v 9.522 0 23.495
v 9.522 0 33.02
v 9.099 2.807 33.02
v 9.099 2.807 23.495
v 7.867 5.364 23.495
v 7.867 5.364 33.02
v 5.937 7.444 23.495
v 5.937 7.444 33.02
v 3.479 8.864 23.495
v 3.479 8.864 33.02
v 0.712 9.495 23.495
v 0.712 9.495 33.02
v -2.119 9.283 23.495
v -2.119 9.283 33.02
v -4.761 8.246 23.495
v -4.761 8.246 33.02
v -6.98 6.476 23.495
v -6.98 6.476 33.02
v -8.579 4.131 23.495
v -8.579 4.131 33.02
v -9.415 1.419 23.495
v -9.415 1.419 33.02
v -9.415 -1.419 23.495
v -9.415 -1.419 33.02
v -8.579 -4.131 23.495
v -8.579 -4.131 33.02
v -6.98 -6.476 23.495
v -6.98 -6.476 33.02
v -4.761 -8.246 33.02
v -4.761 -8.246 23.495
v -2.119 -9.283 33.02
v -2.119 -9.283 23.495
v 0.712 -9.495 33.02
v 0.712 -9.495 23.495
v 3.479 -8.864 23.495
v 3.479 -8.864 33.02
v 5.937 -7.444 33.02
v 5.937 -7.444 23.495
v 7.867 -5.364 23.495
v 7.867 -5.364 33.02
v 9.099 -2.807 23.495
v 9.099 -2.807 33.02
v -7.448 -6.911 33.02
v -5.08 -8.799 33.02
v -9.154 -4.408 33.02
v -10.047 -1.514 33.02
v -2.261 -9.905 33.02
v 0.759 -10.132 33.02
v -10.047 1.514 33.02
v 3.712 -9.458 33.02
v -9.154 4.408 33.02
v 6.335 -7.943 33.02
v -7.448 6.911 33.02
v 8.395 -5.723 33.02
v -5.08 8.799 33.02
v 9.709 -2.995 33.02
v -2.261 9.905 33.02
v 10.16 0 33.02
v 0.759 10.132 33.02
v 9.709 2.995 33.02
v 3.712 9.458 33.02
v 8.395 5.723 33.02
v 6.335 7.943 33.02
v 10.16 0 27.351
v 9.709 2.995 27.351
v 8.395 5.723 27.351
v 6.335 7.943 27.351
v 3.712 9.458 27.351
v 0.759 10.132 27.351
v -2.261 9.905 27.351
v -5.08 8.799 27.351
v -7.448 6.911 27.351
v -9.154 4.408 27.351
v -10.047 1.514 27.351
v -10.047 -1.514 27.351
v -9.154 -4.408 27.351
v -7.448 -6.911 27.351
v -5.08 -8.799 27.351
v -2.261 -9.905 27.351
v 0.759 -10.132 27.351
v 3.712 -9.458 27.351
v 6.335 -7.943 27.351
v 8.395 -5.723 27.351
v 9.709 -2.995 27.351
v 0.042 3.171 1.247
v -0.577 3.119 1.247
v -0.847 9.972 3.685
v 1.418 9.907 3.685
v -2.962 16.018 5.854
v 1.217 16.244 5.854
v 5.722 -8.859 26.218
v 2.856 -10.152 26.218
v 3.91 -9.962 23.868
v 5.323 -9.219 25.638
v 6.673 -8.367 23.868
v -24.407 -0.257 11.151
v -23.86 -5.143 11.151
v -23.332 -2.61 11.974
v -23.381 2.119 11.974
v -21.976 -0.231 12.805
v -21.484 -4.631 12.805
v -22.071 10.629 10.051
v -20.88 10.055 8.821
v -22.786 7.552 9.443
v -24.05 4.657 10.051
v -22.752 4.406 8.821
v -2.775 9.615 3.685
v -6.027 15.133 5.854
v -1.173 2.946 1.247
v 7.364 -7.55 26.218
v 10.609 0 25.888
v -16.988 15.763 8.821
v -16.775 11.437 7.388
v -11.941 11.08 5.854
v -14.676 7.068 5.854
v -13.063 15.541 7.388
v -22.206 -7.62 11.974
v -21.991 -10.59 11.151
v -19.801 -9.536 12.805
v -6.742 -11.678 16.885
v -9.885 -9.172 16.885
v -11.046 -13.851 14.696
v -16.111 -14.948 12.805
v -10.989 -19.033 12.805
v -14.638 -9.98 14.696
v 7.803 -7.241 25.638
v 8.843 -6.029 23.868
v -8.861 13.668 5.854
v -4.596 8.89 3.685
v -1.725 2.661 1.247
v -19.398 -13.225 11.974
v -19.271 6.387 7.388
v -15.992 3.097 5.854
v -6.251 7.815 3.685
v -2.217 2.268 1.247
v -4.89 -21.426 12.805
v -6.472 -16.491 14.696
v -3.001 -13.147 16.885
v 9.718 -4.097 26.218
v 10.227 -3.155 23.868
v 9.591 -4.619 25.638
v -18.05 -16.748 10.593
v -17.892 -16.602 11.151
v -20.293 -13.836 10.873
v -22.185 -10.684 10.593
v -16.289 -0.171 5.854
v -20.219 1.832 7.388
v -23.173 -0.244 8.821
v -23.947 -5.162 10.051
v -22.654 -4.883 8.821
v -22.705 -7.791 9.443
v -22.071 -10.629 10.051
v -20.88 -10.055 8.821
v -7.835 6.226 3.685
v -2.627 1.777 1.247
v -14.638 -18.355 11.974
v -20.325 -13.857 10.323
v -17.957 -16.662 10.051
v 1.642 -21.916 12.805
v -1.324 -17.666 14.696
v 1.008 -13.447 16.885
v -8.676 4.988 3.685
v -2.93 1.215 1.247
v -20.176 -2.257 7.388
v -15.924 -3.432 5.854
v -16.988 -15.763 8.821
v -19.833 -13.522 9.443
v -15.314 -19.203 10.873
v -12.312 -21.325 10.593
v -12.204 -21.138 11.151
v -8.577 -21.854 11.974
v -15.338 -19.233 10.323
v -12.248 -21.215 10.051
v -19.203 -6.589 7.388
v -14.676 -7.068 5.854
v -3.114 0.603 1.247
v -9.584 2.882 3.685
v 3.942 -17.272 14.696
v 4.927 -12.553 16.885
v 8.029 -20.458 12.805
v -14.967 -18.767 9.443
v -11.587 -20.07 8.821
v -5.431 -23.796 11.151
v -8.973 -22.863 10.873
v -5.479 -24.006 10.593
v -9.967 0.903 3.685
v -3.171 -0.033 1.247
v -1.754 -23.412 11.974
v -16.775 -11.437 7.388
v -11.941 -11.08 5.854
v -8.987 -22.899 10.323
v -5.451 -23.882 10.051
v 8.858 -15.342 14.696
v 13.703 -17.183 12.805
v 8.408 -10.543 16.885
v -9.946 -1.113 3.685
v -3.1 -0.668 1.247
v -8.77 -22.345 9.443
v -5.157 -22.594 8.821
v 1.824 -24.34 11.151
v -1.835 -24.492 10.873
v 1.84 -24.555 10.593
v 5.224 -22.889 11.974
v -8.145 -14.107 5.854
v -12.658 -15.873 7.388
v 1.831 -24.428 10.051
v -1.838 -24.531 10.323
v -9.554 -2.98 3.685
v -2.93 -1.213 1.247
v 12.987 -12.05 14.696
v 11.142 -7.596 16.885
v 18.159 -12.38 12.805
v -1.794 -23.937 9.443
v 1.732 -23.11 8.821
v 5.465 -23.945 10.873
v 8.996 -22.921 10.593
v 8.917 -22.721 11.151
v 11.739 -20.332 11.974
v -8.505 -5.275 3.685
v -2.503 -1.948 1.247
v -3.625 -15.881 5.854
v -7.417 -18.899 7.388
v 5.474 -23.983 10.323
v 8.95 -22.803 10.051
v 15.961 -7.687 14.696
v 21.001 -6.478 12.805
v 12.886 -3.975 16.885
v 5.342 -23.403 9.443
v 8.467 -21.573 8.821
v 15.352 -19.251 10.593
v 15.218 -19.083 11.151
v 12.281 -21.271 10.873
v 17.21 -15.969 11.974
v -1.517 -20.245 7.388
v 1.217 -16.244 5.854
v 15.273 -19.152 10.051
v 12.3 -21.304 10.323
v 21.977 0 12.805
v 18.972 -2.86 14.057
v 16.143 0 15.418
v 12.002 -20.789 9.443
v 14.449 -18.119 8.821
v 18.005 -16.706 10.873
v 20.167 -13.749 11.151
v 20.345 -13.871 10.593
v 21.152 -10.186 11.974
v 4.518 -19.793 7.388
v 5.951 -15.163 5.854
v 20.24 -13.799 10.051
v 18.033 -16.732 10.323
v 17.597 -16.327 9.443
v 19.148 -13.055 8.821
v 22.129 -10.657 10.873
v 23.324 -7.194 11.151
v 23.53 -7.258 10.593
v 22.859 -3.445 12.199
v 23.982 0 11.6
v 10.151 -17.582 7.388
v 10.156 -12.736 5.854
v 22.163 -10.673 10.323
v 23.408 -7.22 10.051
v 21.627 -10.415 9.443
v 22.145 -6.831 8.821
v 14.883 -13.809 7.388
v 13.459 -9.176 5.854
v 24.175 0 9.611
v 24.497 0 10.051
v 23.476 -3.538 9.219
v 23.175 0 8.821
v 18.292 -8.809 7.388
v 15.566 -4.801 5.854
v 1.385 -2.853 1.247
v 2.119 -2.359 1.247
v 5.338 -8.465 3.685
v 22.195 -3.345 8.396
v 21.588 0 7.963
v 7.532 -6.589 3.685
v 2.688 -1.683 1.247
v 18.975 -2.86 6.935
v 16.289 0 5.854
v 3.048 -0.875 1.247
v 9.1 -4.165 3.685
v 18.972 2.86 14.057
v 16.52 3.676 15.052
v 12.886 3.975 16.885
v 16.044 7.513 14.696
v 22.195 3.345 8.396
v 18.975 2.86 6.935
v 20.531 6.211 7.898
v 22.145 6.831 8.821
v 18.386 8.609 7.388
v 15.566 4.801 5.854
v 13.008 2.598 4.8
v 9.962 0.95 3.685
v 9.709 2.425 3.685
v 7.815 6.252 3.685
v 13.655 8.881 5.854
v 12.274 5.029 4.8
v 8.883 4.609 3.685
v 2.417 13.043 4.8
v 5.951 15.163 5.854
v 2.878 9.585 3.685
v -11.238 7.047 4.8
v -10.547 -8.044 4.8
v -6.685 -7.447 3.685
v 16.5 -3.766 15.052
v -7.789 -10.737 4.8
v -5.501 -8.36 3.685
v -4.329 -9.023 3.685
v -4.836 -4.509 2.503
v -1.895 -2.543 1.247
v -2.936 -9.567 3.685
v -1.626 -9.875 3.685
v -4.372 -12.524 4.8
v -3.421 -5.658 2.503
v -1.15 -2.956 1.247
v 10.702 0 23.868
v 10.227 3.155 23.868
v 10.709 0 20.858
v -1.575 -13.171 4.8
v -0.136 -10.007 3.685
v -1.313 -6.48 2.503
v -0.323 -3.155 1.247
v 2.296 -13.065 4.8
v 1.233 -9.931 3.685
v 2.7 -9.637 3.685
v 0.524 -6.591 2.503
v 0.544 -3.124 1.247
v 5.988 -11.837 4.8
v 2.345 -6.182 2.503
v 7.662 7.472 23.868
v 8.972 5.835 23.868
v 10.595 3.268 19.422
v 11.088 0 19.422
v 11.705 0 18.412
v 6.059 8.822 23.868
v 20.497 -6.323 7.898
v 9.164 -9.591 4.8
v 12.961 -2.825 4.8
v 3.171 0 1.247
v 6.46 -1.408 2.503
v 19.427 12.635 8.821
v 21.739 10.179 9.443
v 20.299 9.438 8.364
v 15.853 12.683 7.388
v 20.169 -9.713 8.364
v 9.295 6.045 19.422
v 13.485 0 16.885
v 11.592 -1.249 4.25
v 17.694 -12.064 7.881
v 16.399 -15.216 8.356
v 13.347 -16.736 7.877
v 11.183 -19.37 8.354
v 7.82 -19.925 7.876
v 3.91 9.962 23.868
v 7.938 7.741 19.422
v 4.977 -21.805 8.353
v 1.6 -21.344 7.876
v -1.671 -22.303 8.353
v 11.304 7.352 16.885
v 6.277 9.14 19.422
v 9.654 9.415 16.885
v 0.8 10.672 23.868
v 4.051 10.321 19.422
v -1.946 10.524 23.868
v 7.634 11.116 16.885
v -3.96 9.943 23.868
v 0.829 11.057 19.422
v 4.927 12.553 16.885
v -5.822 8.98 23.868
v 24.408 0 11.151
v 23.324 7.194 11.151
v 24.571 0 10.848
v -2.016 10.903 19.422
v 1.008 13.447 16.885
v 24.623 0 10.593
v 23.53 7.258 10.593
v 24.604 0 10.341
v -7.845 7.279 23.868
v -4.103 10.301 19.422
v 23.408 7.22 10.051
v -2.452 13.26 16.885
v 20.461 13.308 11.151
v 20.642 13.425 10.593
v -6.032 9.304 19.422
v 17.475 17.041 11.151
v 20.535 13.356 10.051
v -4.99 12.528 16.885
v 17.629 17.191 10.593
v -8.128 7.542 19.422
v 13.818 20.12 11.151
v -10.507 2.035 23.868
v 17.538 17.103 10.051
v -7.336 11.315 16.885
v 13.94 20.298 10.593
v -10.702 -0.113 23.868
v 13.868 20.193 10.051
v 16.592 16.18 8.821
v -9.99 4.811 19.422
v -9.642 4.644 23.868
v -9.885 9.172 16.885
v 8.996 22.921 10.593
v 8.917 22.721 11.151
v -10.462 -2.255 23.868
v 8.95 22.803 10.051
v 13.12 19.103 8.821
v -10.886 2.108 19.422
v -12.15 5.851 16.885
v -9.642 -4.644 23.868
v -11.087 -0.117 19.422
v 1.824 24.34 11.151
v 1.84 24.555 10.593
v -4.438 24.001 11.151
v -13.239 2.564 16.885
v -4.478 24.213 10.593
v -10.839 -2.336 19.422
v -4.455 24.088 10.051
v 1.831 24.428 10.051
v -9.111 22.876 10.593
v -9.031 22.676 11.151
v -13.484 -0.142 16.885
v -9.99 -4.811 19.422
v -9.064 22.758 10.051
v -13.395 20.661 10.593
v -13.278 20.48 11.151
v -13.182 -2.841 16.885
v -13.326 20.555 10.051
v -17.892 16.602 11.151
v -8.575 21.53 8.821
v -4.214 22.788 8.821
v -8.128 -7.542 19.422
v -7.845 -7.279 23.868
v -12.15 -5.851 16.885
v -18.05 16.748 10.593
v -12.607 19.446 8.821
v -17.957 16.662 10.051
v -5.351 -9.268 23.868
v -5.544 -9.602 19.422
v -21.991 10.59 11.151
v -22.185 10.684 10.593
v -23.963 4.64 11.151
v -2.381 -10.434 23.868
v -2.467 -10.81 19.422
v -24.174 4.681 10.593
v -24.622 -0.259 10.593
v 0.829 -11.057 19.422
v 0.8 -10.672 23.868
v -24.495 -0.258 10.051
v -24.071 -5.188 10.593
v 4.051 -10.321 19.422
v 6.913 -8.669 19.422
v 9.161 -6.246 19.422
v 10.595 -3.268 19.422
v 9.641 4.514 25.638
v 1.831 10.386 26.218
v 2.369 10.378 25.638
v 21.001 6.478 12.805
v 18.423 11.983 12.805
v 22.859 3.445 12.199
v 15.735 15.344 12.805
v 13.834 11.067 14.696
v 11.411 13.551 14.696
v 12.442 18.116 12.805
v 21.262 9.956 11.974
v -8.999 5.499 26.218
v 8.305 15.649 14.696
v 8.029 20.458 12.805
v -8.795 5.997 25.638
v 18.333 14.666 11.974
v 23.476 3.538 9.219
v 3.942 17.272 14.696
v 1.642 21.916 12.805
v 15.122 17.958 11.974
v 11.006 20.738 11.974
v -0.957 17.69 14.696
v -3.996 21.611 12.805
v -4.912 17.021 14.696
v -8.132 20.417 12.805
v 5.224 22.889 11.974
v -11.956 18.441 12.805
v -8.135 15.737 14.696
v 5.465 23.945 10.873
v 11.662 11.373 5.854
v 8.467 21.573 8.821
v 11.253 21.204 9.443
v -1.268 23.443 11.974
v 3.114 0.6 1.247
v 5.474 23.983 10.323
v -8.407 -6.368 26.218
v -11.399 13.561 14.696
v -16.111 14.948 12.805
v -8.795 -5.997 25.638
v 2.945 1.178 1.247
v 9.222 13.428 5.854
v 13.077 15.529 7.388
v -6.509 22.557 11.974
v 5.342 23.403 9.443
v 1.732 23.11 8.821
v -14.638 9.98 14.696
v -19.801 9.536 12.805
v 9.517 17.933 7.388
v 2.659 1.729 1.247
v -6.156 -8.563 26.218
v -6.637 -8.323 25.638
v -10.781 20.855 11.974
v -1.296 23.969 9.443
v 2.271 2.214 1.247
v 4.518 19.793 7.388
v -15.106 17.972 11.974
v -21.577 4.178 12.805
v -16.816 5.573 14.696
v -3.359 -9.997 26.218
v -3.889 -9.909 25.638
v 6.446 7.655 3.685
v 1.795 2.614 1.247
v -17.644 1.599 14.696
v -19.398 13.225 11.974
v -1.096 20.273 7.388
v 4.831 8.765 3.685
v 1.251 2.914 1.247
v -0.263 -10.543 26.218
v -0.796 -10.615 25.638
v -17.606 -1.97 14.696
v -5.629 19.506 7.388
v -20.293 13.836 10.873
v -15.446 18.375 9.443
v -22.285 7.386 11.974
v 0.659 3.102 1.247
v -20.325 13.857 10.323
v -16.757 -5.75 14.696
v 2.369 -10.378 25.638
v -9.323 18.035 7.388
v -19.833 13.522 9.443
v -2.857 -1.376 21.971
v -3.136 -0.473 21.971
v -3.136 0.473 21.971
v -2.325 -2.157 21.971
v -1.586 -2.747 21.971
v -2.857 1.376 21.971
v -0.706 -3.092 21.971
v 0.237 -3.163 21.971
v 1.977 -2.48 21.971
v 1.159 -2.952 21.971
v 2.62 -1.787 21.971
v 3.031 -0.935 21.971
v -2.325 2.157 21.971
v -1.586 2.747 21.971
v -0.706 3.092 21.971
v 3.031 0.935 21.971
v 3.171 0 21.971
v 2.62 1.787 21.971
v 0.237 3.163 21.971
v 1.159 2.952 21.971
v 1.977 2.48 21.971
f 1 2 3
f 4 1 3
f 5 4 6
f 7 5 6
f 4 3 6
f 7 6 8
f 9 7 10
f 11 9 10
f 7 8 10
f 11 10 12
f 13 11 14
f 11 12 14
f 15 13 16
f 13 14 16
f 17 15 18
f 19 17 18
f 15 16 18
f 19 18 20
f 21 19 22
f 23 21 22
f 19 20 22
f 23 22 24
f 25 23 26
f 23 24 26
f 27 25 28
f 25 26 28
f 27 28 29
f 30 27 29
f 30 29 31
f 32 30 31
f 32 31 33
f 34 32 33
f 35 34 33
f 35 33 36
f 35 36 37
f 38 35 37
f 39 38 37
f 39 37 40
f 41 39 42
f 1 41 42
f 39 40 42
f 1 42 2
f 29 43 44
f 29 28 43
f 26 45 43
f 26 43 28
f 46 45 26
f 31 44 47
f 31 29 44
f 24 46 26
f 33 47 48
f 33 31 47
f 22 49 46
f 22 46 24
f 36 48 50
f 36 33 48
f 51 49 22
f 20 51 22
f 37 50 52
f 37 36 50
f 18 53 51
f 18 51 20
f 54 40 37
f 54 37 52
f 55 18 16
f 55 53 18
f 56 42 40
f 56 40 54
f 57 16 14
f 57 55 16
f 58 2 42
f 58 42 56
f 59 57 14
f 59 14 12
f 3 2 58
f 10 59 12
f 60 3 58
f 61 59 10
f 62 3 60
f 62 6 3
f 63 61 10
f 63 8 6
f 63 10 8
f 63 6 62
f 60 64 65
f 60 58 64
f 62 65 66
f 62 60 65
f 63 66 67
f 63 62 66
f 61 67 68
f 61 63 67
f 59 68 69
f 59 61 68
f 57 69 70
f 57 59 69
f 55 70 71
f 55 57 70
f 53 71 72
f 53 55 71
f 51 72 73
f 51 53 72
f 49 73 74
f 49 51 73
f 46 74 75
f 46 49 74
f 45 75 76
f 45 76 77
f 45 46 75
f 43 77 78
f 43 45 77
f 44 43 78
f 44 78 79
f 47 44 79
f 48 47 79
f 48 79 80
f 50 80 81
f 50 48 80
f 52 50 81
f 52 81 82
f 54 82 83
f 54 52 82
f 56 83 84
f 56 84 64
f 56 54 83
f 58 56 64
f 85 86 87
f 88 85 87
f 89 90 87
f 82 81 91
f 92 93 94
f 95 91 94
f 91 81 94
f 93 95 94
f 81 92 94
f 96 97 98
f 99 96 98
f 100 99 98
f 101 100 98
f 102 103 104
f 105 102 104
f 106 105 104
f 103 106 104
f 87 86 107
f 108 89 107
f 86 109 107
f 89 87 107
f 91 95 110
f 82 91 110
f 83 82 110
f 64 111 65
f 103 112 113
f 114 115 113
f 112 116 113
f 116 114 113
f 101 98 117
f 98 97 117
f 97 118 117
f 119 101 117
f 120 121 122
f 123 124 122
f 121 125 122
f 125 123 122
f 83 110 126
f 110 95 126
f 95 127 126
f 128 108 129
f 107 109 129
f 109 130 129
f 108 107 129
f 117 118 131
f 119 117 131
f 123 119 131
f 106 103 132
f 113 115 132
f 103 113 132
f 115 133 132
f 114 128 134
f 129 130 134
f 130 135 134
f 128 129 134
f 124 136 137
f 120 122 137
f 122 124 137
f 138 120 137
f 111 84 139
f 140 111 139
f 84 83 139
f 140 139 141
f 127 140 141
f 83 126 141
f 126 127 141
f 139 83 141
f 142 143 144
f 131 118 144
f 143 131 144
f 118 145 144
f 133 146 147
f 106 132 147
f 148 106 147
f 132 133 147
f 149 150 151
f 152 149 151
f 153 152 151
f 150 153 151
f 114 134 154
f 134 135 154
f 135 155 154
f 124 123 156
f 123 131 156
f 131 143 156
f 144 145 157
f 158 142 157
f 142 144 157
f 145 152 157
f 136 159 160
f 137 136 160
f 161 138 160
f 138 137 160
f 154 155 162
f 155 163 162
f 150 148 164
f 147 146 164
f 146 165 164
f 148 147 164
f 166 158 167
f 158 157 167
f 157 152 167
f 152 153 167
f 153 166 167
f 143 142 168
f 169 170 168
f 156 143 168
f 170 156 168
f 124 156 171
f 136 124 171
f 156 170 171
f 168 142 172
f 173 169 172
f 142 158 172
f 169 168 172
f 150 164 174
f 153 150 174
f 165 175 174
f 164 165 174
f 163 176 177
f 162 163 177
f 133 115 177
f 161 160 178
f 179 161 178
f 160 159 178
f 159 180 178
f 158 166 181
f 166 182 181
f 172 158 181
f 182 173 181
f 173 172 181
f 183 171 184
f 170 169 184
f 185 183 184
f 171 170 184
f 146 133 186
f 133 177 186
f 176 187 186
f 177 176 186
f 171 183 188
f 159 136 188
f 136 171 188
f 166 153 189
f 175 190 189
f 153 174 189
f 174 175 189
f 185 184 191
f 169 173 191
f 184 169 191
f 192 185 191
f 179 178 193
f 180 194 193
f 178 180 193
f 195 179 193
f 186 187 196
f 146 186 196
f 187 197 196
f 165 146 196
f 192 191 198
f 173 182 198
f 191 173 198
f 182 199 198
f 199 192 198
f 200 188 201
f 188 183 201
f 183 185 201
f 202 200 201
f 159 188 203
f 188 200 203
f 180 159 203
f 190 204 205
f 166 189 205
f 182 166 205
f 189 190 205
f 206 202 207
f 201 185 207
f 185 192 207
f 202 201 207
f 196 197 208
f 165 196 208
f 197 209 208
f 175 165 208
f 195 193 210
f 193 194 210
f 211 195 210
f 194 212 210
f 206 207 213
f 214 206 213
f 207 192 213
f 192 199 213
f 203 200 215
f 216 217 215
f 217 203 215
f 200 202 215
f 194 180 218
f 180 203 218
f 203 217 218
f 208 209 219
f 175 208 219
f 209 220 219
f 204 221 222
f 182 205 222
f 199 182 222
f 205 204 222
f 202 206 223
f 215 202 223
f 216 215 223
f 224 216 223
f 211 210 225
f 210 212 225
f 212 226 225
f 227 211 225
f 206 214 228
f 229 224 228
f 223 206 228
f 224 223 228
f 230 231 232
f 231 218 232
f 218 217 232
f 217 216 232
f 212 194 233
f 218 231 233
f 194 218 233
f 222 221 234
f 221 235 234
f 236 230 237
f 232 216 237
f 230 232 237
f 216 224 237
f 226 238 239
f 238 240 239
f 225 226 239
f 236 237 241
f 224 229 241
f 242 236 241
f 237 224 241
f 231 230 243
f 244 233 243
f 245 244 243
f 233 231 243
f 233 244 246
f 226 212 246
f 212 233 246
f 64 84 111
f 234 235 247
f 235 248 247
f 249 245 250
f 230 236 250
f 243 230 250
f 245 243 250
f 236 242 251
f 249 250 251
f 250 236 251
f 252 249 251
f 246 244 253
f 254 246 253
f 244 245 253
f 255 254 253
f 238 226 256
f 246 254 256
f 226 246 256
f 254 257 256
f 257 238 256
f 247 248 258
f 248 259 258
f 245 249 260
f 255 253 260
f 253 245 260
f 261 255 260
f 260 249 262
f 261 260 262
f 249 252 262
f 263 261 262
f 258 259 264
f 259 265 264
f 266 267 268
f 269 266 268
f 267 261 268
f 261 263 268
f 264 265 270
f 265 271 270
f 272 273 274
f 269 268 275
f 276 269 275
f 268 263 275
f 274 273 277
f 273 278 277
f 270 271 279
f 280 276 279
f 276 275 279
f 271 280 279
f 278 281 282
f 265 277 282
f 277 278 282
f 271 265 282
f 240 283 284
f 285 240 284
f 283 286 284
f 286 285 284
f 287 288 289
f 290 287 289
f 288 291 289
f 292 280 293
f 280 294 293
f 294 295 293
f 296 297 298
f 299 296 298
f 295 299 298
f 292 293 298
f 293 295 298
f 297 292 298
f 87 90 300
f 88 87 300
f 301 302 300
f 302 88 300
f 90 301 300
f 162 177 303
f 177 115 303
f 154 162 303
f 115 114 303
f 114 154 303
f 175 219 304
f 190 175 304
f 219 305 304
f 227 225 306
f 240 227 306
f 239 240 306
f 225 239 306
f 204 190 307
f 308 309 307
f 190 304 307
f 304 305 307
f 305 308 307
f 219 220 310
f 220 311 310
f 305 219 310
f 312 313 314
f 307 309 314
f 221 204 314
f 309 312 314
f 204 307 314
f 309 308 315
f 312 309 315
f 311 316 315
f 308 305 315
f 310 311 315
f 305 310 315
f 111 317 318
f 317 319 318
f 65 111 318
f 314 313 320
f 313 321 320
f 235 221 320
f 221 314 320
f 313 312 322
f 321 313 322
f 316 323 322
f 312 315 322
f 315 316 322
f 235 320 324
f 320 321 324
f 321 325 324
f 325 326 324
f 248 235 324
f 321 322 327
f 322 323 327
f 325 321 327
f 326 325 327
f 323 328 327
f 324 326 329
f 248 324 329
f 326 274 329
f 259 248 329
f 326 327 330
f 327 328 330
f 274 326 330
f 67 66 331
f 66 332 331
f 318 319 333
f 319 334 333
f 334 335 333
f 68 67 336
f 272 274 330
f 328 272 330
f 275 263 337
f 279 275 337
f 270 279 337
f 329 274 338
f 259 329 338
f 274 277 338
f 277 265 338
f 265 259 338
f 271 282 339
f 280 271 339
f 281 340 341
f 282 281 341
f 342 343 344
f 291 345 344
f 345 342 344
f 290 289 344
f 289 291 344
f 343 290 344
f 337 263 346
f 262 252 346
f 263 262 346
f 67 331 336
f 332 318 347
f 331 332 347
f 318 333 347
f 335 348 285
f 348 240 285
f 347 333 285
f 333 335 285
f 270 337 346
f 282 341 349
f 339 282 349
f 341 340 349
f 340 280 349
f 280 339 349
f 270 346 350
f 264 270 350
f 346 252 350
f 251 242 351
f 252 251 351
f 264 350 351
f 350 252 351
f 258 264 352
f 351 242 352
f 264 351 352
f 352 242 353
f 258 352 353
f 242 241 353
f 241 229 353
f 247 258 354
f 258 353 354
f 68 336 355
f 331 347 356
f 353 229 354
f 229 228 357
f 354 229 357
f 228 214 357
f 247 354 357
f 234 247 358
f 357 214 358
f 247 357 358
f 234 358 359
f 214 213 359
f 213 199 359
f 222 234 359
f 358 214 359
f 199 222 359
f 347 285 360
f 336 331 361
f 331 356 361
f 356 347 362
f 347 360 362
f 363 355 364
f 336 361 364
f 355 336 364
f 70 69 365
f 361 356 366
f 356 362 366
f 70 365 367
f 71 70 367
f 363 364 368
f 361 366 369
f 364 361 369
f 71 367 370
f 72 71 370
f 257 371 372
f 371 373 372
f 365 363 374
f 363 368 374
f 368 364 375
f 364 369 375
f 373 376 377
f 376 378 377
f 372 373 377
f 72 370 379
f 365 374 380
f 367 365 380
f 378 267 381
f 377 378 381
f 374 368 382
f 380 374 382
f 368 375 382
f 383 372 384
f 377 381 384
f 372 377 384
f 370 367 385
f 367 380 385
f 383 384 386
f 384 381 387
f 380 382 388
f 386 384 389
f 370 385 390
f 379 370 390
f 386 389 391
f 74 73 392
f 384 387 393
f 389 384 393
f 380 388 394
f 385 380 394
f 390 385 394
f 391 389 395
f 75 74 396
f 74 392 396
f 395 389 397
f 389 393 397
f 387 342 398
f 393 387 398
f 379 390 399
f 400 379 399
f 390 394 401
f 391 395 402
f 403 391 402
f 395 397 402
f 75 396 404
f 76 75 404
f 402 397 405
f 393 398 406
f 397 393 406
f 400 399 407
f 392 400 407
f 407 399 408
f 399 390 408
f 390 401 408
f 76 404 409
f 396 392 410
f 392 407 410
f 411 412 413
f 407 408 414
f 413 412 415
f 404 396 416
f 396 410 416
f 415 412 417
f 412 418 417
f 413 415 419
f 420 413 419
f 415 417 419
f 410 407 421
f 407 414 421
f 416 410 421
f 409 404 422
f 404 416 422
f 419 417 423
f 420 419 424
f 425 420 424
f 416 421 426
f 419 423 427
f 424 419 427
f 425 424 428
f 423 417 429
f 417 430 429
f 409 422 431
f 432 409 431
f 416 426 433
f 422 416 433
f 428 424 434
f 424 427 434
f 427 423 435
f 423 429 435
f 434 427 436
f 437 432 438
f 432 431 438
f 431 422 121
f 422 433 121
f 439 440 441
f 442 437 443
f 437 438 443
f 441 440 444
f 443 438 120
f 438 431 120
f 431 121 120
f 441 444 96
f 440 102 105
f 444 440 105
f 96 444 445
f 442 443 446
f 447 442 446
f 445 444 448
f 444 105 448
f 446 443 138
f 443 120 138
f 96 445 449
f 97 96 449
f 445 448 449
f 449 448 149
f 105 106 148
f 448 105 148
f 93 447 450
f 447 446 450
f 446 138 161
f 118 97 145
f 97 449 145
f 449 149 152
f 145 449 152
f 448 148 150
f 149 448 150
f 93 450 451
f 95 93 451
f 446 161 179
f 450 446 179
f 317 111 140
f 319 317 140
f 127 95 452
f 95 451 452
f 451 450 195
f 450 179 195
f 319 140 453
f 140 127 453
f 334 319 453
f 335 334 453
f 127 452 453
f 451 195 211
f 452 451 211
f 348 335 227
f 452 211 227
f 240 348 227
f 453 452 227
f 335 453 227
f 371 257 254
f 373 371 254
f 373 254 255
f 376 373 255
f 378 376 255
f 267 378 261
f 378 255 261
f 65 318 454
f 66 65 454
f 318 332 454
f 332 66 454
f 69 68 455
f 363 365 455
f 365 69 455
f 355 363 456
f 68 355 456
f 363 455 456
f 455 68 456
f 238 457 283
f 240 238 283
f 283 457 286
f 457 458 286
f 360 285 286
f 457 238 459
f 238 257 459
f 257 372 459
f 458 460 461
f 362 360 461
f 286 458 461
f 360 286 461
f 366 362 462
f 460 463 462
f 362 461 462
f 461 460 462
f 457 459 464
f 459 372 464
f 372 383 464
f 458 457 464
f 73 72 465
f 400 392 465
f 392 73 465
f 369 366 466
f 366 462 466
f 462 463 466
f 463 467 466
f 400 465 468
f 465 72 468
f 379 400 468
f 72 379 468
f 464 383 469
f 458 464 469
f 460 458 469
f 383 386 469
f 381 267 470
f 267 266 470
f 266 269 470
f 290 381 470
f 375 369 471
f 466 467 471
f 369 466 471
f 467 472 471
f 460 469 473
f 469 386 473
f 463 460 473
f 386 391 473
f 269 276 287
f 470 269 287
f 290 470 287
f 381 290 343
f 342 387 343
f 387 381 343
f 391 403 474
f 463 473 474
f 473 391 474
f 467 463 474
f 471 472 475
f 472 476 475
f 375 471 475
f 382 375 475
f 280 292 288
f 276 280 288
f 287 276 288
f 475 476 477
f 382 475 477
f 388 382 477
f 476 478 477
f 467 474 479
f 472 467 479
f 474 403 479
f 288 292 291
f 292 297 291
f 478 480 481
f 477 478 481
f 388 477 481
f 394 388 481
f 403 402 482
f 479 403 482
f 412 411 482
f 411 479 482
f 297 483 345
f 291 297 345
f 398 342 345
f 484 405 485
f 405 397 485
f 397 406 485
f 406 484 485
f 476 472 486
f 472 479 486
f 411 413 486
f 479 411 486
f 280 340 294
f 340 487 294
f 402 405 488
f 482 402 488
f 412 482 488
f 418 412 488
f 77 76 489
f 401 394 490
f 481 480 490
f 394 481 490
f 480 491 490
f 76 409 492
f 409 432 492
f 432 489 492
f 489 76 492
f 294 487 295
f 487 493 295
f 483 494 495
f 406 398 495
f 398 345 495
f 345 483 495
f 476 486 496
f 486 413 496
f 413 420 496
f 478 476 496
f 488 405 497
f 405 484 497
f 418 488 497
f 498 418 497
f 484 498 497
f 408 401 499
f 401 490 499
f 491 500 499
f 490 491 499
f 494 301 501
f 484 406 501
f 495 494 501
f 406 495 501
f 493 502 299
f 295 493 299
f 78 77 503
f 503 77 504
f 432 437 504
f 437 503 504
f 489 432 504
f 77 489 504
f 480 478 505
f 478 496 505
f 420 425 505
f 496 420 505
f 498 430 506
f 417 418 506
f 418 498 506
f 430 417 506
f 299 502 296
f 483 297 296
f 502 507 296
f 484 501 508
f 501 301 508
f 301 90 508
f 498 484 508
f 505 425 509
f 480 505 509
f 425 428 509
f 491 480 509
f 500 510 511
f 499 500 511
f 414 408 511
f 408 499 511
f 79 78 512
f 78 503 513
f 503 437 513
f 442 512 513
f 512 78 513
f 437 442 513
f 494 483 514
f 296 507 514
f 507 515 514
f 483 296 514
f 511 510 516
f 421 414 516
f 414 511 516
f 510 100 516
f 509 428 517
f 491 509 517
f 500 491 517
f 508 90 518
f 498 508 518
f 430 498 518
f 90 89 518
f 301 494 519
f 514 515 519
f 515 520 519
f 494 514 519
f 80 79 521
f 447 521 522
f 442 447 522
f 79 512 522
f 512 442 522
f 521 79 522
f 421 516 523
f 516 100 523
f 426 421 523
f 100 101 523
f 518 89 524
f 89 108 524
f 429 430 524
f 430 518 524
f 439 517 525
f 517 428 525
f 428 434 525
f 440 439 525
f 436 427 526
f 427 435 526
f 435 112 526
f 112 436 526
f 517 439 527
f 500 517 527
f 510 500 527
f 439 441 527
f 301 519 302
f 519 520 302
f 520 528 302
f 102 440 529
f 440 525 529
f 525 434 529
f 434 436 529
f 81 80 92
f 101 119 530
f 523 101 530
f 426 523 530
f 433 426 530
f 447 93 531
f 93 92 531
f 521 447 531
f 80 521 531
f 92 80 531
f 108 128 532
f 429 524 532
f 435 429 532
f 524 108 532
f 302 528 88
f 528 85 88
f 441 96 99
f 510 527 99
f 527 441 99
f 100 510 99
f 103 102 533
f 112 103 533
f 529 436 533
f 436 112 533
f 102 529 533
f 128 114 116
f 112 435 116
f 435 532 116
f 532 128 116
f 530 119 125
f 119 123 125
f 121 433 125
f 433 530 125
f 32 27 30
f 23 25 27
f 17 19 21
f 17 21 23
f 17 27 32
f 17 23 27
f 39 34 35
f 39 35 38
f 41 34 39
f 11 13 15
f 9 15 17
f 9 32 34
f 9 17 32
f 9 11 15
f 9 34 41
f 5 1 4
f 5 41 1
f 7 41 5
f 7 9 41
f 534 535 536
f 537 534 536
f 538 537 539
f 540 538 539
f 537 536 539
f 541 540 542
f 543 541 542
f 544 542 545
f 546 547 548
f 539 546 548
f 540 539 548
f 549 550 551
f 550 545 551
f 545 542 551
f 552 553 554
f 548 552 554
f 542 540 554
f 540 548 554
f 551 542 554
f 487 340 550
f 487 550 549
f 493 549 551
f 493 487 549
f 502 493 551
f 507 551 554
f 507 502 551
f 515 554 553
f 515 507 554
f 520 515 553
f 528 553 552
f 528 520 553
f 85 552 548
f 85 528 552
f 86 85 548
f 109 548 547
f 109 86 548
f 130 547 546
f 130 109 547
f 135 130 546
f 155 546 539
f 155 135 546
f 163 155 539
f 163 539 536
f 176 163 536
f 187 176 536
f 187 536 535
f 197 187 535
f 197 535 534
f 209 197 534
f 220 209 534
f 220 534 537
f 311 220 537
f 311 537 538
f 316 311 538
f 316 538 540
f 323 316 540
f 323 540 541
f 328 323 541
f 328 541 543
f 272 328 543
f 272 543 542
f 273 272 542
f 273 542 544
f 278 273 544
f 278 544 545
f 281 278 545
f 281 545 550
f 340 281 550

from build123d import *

# Parameters (mm, degrees)
F2_R     = 9.521825
F3_DEPTH = 9.525
F4_R     = 3.171444
F5_DEPTH = 21.971


with BuildPart() as f1:
    # F0 (on Front) → F1 (revolve)
    with BuildSketch(Plane.XZ):
        with BuildLine():
            Line((0, 33.02), (0, 0))
            add(Edge.make_bspline(
                [(10.16, 27.3511130363), (11.5553398253, 24.4607770349), (7.0775196637, 16.6801527294), (36.2337549357, 10.3298059575), (11.6101046519, 4.7742649452), (0, 0)],
                knots=[0.2205712239, 0.2205712239, 0.2205712239, 0.2205712239, 0.4148665878, 0.6648550926, 1, 1, 1, 1], degree=3))
            add(Edge.make_bspline(
                [(0.7323480686, 33.02), (3.6263896015, 32.8108602969), (8.7082667586, 30.3582635354), (10.16, 27.3511130363)],
                knots=[0.0184233075, 0.0184233075, 0.0184233075, 0.0184233075, 0.2205712239, 0.2205712239, 0.2205712239, 0.2205712239], degree=3))
            Line((0.7323480686, 33.02), (0, 33.02))
        make_face()
        with BuildLine():
            add(Edge.make_bspline(
                [(0.7323480686, 33.02), (3.6263896015, 32.8108602969), (8.7082667586, 30.3582635354), (10.16, 27.3511130363)],
                knots=[0.0184233075, 0.0184233075, 0.0184233075, 0.0184233075, 0.2205712239, 0.2205712239, 0.2205712239, 0.2205712239], degree=3))
            Line((10.16, 27.3511130363), (10.16, 33.02))
            Line((10.16, 33.02), (0.7323480686, 33.02))
        make_face()
    revolve(axis=Axis((0, 0, 16.51), (0, 0, 1)))

    # F2 (on face) → F3 (cut)
    with BuildSketch(Plane.XY.offset(33.02)):
        Circle(F2_R)
    extrude(amount=-F3_DEPTH, mode=Mode.SUBTRACT)

    # F4 (on Top) → F5 (cut)
    with BuildSketch(Plane.XY):
        Circle(F4_R)
    extrude(amount=F5_DEPTH, mode=Mode.SUBTRACT)


solid = f1.part
